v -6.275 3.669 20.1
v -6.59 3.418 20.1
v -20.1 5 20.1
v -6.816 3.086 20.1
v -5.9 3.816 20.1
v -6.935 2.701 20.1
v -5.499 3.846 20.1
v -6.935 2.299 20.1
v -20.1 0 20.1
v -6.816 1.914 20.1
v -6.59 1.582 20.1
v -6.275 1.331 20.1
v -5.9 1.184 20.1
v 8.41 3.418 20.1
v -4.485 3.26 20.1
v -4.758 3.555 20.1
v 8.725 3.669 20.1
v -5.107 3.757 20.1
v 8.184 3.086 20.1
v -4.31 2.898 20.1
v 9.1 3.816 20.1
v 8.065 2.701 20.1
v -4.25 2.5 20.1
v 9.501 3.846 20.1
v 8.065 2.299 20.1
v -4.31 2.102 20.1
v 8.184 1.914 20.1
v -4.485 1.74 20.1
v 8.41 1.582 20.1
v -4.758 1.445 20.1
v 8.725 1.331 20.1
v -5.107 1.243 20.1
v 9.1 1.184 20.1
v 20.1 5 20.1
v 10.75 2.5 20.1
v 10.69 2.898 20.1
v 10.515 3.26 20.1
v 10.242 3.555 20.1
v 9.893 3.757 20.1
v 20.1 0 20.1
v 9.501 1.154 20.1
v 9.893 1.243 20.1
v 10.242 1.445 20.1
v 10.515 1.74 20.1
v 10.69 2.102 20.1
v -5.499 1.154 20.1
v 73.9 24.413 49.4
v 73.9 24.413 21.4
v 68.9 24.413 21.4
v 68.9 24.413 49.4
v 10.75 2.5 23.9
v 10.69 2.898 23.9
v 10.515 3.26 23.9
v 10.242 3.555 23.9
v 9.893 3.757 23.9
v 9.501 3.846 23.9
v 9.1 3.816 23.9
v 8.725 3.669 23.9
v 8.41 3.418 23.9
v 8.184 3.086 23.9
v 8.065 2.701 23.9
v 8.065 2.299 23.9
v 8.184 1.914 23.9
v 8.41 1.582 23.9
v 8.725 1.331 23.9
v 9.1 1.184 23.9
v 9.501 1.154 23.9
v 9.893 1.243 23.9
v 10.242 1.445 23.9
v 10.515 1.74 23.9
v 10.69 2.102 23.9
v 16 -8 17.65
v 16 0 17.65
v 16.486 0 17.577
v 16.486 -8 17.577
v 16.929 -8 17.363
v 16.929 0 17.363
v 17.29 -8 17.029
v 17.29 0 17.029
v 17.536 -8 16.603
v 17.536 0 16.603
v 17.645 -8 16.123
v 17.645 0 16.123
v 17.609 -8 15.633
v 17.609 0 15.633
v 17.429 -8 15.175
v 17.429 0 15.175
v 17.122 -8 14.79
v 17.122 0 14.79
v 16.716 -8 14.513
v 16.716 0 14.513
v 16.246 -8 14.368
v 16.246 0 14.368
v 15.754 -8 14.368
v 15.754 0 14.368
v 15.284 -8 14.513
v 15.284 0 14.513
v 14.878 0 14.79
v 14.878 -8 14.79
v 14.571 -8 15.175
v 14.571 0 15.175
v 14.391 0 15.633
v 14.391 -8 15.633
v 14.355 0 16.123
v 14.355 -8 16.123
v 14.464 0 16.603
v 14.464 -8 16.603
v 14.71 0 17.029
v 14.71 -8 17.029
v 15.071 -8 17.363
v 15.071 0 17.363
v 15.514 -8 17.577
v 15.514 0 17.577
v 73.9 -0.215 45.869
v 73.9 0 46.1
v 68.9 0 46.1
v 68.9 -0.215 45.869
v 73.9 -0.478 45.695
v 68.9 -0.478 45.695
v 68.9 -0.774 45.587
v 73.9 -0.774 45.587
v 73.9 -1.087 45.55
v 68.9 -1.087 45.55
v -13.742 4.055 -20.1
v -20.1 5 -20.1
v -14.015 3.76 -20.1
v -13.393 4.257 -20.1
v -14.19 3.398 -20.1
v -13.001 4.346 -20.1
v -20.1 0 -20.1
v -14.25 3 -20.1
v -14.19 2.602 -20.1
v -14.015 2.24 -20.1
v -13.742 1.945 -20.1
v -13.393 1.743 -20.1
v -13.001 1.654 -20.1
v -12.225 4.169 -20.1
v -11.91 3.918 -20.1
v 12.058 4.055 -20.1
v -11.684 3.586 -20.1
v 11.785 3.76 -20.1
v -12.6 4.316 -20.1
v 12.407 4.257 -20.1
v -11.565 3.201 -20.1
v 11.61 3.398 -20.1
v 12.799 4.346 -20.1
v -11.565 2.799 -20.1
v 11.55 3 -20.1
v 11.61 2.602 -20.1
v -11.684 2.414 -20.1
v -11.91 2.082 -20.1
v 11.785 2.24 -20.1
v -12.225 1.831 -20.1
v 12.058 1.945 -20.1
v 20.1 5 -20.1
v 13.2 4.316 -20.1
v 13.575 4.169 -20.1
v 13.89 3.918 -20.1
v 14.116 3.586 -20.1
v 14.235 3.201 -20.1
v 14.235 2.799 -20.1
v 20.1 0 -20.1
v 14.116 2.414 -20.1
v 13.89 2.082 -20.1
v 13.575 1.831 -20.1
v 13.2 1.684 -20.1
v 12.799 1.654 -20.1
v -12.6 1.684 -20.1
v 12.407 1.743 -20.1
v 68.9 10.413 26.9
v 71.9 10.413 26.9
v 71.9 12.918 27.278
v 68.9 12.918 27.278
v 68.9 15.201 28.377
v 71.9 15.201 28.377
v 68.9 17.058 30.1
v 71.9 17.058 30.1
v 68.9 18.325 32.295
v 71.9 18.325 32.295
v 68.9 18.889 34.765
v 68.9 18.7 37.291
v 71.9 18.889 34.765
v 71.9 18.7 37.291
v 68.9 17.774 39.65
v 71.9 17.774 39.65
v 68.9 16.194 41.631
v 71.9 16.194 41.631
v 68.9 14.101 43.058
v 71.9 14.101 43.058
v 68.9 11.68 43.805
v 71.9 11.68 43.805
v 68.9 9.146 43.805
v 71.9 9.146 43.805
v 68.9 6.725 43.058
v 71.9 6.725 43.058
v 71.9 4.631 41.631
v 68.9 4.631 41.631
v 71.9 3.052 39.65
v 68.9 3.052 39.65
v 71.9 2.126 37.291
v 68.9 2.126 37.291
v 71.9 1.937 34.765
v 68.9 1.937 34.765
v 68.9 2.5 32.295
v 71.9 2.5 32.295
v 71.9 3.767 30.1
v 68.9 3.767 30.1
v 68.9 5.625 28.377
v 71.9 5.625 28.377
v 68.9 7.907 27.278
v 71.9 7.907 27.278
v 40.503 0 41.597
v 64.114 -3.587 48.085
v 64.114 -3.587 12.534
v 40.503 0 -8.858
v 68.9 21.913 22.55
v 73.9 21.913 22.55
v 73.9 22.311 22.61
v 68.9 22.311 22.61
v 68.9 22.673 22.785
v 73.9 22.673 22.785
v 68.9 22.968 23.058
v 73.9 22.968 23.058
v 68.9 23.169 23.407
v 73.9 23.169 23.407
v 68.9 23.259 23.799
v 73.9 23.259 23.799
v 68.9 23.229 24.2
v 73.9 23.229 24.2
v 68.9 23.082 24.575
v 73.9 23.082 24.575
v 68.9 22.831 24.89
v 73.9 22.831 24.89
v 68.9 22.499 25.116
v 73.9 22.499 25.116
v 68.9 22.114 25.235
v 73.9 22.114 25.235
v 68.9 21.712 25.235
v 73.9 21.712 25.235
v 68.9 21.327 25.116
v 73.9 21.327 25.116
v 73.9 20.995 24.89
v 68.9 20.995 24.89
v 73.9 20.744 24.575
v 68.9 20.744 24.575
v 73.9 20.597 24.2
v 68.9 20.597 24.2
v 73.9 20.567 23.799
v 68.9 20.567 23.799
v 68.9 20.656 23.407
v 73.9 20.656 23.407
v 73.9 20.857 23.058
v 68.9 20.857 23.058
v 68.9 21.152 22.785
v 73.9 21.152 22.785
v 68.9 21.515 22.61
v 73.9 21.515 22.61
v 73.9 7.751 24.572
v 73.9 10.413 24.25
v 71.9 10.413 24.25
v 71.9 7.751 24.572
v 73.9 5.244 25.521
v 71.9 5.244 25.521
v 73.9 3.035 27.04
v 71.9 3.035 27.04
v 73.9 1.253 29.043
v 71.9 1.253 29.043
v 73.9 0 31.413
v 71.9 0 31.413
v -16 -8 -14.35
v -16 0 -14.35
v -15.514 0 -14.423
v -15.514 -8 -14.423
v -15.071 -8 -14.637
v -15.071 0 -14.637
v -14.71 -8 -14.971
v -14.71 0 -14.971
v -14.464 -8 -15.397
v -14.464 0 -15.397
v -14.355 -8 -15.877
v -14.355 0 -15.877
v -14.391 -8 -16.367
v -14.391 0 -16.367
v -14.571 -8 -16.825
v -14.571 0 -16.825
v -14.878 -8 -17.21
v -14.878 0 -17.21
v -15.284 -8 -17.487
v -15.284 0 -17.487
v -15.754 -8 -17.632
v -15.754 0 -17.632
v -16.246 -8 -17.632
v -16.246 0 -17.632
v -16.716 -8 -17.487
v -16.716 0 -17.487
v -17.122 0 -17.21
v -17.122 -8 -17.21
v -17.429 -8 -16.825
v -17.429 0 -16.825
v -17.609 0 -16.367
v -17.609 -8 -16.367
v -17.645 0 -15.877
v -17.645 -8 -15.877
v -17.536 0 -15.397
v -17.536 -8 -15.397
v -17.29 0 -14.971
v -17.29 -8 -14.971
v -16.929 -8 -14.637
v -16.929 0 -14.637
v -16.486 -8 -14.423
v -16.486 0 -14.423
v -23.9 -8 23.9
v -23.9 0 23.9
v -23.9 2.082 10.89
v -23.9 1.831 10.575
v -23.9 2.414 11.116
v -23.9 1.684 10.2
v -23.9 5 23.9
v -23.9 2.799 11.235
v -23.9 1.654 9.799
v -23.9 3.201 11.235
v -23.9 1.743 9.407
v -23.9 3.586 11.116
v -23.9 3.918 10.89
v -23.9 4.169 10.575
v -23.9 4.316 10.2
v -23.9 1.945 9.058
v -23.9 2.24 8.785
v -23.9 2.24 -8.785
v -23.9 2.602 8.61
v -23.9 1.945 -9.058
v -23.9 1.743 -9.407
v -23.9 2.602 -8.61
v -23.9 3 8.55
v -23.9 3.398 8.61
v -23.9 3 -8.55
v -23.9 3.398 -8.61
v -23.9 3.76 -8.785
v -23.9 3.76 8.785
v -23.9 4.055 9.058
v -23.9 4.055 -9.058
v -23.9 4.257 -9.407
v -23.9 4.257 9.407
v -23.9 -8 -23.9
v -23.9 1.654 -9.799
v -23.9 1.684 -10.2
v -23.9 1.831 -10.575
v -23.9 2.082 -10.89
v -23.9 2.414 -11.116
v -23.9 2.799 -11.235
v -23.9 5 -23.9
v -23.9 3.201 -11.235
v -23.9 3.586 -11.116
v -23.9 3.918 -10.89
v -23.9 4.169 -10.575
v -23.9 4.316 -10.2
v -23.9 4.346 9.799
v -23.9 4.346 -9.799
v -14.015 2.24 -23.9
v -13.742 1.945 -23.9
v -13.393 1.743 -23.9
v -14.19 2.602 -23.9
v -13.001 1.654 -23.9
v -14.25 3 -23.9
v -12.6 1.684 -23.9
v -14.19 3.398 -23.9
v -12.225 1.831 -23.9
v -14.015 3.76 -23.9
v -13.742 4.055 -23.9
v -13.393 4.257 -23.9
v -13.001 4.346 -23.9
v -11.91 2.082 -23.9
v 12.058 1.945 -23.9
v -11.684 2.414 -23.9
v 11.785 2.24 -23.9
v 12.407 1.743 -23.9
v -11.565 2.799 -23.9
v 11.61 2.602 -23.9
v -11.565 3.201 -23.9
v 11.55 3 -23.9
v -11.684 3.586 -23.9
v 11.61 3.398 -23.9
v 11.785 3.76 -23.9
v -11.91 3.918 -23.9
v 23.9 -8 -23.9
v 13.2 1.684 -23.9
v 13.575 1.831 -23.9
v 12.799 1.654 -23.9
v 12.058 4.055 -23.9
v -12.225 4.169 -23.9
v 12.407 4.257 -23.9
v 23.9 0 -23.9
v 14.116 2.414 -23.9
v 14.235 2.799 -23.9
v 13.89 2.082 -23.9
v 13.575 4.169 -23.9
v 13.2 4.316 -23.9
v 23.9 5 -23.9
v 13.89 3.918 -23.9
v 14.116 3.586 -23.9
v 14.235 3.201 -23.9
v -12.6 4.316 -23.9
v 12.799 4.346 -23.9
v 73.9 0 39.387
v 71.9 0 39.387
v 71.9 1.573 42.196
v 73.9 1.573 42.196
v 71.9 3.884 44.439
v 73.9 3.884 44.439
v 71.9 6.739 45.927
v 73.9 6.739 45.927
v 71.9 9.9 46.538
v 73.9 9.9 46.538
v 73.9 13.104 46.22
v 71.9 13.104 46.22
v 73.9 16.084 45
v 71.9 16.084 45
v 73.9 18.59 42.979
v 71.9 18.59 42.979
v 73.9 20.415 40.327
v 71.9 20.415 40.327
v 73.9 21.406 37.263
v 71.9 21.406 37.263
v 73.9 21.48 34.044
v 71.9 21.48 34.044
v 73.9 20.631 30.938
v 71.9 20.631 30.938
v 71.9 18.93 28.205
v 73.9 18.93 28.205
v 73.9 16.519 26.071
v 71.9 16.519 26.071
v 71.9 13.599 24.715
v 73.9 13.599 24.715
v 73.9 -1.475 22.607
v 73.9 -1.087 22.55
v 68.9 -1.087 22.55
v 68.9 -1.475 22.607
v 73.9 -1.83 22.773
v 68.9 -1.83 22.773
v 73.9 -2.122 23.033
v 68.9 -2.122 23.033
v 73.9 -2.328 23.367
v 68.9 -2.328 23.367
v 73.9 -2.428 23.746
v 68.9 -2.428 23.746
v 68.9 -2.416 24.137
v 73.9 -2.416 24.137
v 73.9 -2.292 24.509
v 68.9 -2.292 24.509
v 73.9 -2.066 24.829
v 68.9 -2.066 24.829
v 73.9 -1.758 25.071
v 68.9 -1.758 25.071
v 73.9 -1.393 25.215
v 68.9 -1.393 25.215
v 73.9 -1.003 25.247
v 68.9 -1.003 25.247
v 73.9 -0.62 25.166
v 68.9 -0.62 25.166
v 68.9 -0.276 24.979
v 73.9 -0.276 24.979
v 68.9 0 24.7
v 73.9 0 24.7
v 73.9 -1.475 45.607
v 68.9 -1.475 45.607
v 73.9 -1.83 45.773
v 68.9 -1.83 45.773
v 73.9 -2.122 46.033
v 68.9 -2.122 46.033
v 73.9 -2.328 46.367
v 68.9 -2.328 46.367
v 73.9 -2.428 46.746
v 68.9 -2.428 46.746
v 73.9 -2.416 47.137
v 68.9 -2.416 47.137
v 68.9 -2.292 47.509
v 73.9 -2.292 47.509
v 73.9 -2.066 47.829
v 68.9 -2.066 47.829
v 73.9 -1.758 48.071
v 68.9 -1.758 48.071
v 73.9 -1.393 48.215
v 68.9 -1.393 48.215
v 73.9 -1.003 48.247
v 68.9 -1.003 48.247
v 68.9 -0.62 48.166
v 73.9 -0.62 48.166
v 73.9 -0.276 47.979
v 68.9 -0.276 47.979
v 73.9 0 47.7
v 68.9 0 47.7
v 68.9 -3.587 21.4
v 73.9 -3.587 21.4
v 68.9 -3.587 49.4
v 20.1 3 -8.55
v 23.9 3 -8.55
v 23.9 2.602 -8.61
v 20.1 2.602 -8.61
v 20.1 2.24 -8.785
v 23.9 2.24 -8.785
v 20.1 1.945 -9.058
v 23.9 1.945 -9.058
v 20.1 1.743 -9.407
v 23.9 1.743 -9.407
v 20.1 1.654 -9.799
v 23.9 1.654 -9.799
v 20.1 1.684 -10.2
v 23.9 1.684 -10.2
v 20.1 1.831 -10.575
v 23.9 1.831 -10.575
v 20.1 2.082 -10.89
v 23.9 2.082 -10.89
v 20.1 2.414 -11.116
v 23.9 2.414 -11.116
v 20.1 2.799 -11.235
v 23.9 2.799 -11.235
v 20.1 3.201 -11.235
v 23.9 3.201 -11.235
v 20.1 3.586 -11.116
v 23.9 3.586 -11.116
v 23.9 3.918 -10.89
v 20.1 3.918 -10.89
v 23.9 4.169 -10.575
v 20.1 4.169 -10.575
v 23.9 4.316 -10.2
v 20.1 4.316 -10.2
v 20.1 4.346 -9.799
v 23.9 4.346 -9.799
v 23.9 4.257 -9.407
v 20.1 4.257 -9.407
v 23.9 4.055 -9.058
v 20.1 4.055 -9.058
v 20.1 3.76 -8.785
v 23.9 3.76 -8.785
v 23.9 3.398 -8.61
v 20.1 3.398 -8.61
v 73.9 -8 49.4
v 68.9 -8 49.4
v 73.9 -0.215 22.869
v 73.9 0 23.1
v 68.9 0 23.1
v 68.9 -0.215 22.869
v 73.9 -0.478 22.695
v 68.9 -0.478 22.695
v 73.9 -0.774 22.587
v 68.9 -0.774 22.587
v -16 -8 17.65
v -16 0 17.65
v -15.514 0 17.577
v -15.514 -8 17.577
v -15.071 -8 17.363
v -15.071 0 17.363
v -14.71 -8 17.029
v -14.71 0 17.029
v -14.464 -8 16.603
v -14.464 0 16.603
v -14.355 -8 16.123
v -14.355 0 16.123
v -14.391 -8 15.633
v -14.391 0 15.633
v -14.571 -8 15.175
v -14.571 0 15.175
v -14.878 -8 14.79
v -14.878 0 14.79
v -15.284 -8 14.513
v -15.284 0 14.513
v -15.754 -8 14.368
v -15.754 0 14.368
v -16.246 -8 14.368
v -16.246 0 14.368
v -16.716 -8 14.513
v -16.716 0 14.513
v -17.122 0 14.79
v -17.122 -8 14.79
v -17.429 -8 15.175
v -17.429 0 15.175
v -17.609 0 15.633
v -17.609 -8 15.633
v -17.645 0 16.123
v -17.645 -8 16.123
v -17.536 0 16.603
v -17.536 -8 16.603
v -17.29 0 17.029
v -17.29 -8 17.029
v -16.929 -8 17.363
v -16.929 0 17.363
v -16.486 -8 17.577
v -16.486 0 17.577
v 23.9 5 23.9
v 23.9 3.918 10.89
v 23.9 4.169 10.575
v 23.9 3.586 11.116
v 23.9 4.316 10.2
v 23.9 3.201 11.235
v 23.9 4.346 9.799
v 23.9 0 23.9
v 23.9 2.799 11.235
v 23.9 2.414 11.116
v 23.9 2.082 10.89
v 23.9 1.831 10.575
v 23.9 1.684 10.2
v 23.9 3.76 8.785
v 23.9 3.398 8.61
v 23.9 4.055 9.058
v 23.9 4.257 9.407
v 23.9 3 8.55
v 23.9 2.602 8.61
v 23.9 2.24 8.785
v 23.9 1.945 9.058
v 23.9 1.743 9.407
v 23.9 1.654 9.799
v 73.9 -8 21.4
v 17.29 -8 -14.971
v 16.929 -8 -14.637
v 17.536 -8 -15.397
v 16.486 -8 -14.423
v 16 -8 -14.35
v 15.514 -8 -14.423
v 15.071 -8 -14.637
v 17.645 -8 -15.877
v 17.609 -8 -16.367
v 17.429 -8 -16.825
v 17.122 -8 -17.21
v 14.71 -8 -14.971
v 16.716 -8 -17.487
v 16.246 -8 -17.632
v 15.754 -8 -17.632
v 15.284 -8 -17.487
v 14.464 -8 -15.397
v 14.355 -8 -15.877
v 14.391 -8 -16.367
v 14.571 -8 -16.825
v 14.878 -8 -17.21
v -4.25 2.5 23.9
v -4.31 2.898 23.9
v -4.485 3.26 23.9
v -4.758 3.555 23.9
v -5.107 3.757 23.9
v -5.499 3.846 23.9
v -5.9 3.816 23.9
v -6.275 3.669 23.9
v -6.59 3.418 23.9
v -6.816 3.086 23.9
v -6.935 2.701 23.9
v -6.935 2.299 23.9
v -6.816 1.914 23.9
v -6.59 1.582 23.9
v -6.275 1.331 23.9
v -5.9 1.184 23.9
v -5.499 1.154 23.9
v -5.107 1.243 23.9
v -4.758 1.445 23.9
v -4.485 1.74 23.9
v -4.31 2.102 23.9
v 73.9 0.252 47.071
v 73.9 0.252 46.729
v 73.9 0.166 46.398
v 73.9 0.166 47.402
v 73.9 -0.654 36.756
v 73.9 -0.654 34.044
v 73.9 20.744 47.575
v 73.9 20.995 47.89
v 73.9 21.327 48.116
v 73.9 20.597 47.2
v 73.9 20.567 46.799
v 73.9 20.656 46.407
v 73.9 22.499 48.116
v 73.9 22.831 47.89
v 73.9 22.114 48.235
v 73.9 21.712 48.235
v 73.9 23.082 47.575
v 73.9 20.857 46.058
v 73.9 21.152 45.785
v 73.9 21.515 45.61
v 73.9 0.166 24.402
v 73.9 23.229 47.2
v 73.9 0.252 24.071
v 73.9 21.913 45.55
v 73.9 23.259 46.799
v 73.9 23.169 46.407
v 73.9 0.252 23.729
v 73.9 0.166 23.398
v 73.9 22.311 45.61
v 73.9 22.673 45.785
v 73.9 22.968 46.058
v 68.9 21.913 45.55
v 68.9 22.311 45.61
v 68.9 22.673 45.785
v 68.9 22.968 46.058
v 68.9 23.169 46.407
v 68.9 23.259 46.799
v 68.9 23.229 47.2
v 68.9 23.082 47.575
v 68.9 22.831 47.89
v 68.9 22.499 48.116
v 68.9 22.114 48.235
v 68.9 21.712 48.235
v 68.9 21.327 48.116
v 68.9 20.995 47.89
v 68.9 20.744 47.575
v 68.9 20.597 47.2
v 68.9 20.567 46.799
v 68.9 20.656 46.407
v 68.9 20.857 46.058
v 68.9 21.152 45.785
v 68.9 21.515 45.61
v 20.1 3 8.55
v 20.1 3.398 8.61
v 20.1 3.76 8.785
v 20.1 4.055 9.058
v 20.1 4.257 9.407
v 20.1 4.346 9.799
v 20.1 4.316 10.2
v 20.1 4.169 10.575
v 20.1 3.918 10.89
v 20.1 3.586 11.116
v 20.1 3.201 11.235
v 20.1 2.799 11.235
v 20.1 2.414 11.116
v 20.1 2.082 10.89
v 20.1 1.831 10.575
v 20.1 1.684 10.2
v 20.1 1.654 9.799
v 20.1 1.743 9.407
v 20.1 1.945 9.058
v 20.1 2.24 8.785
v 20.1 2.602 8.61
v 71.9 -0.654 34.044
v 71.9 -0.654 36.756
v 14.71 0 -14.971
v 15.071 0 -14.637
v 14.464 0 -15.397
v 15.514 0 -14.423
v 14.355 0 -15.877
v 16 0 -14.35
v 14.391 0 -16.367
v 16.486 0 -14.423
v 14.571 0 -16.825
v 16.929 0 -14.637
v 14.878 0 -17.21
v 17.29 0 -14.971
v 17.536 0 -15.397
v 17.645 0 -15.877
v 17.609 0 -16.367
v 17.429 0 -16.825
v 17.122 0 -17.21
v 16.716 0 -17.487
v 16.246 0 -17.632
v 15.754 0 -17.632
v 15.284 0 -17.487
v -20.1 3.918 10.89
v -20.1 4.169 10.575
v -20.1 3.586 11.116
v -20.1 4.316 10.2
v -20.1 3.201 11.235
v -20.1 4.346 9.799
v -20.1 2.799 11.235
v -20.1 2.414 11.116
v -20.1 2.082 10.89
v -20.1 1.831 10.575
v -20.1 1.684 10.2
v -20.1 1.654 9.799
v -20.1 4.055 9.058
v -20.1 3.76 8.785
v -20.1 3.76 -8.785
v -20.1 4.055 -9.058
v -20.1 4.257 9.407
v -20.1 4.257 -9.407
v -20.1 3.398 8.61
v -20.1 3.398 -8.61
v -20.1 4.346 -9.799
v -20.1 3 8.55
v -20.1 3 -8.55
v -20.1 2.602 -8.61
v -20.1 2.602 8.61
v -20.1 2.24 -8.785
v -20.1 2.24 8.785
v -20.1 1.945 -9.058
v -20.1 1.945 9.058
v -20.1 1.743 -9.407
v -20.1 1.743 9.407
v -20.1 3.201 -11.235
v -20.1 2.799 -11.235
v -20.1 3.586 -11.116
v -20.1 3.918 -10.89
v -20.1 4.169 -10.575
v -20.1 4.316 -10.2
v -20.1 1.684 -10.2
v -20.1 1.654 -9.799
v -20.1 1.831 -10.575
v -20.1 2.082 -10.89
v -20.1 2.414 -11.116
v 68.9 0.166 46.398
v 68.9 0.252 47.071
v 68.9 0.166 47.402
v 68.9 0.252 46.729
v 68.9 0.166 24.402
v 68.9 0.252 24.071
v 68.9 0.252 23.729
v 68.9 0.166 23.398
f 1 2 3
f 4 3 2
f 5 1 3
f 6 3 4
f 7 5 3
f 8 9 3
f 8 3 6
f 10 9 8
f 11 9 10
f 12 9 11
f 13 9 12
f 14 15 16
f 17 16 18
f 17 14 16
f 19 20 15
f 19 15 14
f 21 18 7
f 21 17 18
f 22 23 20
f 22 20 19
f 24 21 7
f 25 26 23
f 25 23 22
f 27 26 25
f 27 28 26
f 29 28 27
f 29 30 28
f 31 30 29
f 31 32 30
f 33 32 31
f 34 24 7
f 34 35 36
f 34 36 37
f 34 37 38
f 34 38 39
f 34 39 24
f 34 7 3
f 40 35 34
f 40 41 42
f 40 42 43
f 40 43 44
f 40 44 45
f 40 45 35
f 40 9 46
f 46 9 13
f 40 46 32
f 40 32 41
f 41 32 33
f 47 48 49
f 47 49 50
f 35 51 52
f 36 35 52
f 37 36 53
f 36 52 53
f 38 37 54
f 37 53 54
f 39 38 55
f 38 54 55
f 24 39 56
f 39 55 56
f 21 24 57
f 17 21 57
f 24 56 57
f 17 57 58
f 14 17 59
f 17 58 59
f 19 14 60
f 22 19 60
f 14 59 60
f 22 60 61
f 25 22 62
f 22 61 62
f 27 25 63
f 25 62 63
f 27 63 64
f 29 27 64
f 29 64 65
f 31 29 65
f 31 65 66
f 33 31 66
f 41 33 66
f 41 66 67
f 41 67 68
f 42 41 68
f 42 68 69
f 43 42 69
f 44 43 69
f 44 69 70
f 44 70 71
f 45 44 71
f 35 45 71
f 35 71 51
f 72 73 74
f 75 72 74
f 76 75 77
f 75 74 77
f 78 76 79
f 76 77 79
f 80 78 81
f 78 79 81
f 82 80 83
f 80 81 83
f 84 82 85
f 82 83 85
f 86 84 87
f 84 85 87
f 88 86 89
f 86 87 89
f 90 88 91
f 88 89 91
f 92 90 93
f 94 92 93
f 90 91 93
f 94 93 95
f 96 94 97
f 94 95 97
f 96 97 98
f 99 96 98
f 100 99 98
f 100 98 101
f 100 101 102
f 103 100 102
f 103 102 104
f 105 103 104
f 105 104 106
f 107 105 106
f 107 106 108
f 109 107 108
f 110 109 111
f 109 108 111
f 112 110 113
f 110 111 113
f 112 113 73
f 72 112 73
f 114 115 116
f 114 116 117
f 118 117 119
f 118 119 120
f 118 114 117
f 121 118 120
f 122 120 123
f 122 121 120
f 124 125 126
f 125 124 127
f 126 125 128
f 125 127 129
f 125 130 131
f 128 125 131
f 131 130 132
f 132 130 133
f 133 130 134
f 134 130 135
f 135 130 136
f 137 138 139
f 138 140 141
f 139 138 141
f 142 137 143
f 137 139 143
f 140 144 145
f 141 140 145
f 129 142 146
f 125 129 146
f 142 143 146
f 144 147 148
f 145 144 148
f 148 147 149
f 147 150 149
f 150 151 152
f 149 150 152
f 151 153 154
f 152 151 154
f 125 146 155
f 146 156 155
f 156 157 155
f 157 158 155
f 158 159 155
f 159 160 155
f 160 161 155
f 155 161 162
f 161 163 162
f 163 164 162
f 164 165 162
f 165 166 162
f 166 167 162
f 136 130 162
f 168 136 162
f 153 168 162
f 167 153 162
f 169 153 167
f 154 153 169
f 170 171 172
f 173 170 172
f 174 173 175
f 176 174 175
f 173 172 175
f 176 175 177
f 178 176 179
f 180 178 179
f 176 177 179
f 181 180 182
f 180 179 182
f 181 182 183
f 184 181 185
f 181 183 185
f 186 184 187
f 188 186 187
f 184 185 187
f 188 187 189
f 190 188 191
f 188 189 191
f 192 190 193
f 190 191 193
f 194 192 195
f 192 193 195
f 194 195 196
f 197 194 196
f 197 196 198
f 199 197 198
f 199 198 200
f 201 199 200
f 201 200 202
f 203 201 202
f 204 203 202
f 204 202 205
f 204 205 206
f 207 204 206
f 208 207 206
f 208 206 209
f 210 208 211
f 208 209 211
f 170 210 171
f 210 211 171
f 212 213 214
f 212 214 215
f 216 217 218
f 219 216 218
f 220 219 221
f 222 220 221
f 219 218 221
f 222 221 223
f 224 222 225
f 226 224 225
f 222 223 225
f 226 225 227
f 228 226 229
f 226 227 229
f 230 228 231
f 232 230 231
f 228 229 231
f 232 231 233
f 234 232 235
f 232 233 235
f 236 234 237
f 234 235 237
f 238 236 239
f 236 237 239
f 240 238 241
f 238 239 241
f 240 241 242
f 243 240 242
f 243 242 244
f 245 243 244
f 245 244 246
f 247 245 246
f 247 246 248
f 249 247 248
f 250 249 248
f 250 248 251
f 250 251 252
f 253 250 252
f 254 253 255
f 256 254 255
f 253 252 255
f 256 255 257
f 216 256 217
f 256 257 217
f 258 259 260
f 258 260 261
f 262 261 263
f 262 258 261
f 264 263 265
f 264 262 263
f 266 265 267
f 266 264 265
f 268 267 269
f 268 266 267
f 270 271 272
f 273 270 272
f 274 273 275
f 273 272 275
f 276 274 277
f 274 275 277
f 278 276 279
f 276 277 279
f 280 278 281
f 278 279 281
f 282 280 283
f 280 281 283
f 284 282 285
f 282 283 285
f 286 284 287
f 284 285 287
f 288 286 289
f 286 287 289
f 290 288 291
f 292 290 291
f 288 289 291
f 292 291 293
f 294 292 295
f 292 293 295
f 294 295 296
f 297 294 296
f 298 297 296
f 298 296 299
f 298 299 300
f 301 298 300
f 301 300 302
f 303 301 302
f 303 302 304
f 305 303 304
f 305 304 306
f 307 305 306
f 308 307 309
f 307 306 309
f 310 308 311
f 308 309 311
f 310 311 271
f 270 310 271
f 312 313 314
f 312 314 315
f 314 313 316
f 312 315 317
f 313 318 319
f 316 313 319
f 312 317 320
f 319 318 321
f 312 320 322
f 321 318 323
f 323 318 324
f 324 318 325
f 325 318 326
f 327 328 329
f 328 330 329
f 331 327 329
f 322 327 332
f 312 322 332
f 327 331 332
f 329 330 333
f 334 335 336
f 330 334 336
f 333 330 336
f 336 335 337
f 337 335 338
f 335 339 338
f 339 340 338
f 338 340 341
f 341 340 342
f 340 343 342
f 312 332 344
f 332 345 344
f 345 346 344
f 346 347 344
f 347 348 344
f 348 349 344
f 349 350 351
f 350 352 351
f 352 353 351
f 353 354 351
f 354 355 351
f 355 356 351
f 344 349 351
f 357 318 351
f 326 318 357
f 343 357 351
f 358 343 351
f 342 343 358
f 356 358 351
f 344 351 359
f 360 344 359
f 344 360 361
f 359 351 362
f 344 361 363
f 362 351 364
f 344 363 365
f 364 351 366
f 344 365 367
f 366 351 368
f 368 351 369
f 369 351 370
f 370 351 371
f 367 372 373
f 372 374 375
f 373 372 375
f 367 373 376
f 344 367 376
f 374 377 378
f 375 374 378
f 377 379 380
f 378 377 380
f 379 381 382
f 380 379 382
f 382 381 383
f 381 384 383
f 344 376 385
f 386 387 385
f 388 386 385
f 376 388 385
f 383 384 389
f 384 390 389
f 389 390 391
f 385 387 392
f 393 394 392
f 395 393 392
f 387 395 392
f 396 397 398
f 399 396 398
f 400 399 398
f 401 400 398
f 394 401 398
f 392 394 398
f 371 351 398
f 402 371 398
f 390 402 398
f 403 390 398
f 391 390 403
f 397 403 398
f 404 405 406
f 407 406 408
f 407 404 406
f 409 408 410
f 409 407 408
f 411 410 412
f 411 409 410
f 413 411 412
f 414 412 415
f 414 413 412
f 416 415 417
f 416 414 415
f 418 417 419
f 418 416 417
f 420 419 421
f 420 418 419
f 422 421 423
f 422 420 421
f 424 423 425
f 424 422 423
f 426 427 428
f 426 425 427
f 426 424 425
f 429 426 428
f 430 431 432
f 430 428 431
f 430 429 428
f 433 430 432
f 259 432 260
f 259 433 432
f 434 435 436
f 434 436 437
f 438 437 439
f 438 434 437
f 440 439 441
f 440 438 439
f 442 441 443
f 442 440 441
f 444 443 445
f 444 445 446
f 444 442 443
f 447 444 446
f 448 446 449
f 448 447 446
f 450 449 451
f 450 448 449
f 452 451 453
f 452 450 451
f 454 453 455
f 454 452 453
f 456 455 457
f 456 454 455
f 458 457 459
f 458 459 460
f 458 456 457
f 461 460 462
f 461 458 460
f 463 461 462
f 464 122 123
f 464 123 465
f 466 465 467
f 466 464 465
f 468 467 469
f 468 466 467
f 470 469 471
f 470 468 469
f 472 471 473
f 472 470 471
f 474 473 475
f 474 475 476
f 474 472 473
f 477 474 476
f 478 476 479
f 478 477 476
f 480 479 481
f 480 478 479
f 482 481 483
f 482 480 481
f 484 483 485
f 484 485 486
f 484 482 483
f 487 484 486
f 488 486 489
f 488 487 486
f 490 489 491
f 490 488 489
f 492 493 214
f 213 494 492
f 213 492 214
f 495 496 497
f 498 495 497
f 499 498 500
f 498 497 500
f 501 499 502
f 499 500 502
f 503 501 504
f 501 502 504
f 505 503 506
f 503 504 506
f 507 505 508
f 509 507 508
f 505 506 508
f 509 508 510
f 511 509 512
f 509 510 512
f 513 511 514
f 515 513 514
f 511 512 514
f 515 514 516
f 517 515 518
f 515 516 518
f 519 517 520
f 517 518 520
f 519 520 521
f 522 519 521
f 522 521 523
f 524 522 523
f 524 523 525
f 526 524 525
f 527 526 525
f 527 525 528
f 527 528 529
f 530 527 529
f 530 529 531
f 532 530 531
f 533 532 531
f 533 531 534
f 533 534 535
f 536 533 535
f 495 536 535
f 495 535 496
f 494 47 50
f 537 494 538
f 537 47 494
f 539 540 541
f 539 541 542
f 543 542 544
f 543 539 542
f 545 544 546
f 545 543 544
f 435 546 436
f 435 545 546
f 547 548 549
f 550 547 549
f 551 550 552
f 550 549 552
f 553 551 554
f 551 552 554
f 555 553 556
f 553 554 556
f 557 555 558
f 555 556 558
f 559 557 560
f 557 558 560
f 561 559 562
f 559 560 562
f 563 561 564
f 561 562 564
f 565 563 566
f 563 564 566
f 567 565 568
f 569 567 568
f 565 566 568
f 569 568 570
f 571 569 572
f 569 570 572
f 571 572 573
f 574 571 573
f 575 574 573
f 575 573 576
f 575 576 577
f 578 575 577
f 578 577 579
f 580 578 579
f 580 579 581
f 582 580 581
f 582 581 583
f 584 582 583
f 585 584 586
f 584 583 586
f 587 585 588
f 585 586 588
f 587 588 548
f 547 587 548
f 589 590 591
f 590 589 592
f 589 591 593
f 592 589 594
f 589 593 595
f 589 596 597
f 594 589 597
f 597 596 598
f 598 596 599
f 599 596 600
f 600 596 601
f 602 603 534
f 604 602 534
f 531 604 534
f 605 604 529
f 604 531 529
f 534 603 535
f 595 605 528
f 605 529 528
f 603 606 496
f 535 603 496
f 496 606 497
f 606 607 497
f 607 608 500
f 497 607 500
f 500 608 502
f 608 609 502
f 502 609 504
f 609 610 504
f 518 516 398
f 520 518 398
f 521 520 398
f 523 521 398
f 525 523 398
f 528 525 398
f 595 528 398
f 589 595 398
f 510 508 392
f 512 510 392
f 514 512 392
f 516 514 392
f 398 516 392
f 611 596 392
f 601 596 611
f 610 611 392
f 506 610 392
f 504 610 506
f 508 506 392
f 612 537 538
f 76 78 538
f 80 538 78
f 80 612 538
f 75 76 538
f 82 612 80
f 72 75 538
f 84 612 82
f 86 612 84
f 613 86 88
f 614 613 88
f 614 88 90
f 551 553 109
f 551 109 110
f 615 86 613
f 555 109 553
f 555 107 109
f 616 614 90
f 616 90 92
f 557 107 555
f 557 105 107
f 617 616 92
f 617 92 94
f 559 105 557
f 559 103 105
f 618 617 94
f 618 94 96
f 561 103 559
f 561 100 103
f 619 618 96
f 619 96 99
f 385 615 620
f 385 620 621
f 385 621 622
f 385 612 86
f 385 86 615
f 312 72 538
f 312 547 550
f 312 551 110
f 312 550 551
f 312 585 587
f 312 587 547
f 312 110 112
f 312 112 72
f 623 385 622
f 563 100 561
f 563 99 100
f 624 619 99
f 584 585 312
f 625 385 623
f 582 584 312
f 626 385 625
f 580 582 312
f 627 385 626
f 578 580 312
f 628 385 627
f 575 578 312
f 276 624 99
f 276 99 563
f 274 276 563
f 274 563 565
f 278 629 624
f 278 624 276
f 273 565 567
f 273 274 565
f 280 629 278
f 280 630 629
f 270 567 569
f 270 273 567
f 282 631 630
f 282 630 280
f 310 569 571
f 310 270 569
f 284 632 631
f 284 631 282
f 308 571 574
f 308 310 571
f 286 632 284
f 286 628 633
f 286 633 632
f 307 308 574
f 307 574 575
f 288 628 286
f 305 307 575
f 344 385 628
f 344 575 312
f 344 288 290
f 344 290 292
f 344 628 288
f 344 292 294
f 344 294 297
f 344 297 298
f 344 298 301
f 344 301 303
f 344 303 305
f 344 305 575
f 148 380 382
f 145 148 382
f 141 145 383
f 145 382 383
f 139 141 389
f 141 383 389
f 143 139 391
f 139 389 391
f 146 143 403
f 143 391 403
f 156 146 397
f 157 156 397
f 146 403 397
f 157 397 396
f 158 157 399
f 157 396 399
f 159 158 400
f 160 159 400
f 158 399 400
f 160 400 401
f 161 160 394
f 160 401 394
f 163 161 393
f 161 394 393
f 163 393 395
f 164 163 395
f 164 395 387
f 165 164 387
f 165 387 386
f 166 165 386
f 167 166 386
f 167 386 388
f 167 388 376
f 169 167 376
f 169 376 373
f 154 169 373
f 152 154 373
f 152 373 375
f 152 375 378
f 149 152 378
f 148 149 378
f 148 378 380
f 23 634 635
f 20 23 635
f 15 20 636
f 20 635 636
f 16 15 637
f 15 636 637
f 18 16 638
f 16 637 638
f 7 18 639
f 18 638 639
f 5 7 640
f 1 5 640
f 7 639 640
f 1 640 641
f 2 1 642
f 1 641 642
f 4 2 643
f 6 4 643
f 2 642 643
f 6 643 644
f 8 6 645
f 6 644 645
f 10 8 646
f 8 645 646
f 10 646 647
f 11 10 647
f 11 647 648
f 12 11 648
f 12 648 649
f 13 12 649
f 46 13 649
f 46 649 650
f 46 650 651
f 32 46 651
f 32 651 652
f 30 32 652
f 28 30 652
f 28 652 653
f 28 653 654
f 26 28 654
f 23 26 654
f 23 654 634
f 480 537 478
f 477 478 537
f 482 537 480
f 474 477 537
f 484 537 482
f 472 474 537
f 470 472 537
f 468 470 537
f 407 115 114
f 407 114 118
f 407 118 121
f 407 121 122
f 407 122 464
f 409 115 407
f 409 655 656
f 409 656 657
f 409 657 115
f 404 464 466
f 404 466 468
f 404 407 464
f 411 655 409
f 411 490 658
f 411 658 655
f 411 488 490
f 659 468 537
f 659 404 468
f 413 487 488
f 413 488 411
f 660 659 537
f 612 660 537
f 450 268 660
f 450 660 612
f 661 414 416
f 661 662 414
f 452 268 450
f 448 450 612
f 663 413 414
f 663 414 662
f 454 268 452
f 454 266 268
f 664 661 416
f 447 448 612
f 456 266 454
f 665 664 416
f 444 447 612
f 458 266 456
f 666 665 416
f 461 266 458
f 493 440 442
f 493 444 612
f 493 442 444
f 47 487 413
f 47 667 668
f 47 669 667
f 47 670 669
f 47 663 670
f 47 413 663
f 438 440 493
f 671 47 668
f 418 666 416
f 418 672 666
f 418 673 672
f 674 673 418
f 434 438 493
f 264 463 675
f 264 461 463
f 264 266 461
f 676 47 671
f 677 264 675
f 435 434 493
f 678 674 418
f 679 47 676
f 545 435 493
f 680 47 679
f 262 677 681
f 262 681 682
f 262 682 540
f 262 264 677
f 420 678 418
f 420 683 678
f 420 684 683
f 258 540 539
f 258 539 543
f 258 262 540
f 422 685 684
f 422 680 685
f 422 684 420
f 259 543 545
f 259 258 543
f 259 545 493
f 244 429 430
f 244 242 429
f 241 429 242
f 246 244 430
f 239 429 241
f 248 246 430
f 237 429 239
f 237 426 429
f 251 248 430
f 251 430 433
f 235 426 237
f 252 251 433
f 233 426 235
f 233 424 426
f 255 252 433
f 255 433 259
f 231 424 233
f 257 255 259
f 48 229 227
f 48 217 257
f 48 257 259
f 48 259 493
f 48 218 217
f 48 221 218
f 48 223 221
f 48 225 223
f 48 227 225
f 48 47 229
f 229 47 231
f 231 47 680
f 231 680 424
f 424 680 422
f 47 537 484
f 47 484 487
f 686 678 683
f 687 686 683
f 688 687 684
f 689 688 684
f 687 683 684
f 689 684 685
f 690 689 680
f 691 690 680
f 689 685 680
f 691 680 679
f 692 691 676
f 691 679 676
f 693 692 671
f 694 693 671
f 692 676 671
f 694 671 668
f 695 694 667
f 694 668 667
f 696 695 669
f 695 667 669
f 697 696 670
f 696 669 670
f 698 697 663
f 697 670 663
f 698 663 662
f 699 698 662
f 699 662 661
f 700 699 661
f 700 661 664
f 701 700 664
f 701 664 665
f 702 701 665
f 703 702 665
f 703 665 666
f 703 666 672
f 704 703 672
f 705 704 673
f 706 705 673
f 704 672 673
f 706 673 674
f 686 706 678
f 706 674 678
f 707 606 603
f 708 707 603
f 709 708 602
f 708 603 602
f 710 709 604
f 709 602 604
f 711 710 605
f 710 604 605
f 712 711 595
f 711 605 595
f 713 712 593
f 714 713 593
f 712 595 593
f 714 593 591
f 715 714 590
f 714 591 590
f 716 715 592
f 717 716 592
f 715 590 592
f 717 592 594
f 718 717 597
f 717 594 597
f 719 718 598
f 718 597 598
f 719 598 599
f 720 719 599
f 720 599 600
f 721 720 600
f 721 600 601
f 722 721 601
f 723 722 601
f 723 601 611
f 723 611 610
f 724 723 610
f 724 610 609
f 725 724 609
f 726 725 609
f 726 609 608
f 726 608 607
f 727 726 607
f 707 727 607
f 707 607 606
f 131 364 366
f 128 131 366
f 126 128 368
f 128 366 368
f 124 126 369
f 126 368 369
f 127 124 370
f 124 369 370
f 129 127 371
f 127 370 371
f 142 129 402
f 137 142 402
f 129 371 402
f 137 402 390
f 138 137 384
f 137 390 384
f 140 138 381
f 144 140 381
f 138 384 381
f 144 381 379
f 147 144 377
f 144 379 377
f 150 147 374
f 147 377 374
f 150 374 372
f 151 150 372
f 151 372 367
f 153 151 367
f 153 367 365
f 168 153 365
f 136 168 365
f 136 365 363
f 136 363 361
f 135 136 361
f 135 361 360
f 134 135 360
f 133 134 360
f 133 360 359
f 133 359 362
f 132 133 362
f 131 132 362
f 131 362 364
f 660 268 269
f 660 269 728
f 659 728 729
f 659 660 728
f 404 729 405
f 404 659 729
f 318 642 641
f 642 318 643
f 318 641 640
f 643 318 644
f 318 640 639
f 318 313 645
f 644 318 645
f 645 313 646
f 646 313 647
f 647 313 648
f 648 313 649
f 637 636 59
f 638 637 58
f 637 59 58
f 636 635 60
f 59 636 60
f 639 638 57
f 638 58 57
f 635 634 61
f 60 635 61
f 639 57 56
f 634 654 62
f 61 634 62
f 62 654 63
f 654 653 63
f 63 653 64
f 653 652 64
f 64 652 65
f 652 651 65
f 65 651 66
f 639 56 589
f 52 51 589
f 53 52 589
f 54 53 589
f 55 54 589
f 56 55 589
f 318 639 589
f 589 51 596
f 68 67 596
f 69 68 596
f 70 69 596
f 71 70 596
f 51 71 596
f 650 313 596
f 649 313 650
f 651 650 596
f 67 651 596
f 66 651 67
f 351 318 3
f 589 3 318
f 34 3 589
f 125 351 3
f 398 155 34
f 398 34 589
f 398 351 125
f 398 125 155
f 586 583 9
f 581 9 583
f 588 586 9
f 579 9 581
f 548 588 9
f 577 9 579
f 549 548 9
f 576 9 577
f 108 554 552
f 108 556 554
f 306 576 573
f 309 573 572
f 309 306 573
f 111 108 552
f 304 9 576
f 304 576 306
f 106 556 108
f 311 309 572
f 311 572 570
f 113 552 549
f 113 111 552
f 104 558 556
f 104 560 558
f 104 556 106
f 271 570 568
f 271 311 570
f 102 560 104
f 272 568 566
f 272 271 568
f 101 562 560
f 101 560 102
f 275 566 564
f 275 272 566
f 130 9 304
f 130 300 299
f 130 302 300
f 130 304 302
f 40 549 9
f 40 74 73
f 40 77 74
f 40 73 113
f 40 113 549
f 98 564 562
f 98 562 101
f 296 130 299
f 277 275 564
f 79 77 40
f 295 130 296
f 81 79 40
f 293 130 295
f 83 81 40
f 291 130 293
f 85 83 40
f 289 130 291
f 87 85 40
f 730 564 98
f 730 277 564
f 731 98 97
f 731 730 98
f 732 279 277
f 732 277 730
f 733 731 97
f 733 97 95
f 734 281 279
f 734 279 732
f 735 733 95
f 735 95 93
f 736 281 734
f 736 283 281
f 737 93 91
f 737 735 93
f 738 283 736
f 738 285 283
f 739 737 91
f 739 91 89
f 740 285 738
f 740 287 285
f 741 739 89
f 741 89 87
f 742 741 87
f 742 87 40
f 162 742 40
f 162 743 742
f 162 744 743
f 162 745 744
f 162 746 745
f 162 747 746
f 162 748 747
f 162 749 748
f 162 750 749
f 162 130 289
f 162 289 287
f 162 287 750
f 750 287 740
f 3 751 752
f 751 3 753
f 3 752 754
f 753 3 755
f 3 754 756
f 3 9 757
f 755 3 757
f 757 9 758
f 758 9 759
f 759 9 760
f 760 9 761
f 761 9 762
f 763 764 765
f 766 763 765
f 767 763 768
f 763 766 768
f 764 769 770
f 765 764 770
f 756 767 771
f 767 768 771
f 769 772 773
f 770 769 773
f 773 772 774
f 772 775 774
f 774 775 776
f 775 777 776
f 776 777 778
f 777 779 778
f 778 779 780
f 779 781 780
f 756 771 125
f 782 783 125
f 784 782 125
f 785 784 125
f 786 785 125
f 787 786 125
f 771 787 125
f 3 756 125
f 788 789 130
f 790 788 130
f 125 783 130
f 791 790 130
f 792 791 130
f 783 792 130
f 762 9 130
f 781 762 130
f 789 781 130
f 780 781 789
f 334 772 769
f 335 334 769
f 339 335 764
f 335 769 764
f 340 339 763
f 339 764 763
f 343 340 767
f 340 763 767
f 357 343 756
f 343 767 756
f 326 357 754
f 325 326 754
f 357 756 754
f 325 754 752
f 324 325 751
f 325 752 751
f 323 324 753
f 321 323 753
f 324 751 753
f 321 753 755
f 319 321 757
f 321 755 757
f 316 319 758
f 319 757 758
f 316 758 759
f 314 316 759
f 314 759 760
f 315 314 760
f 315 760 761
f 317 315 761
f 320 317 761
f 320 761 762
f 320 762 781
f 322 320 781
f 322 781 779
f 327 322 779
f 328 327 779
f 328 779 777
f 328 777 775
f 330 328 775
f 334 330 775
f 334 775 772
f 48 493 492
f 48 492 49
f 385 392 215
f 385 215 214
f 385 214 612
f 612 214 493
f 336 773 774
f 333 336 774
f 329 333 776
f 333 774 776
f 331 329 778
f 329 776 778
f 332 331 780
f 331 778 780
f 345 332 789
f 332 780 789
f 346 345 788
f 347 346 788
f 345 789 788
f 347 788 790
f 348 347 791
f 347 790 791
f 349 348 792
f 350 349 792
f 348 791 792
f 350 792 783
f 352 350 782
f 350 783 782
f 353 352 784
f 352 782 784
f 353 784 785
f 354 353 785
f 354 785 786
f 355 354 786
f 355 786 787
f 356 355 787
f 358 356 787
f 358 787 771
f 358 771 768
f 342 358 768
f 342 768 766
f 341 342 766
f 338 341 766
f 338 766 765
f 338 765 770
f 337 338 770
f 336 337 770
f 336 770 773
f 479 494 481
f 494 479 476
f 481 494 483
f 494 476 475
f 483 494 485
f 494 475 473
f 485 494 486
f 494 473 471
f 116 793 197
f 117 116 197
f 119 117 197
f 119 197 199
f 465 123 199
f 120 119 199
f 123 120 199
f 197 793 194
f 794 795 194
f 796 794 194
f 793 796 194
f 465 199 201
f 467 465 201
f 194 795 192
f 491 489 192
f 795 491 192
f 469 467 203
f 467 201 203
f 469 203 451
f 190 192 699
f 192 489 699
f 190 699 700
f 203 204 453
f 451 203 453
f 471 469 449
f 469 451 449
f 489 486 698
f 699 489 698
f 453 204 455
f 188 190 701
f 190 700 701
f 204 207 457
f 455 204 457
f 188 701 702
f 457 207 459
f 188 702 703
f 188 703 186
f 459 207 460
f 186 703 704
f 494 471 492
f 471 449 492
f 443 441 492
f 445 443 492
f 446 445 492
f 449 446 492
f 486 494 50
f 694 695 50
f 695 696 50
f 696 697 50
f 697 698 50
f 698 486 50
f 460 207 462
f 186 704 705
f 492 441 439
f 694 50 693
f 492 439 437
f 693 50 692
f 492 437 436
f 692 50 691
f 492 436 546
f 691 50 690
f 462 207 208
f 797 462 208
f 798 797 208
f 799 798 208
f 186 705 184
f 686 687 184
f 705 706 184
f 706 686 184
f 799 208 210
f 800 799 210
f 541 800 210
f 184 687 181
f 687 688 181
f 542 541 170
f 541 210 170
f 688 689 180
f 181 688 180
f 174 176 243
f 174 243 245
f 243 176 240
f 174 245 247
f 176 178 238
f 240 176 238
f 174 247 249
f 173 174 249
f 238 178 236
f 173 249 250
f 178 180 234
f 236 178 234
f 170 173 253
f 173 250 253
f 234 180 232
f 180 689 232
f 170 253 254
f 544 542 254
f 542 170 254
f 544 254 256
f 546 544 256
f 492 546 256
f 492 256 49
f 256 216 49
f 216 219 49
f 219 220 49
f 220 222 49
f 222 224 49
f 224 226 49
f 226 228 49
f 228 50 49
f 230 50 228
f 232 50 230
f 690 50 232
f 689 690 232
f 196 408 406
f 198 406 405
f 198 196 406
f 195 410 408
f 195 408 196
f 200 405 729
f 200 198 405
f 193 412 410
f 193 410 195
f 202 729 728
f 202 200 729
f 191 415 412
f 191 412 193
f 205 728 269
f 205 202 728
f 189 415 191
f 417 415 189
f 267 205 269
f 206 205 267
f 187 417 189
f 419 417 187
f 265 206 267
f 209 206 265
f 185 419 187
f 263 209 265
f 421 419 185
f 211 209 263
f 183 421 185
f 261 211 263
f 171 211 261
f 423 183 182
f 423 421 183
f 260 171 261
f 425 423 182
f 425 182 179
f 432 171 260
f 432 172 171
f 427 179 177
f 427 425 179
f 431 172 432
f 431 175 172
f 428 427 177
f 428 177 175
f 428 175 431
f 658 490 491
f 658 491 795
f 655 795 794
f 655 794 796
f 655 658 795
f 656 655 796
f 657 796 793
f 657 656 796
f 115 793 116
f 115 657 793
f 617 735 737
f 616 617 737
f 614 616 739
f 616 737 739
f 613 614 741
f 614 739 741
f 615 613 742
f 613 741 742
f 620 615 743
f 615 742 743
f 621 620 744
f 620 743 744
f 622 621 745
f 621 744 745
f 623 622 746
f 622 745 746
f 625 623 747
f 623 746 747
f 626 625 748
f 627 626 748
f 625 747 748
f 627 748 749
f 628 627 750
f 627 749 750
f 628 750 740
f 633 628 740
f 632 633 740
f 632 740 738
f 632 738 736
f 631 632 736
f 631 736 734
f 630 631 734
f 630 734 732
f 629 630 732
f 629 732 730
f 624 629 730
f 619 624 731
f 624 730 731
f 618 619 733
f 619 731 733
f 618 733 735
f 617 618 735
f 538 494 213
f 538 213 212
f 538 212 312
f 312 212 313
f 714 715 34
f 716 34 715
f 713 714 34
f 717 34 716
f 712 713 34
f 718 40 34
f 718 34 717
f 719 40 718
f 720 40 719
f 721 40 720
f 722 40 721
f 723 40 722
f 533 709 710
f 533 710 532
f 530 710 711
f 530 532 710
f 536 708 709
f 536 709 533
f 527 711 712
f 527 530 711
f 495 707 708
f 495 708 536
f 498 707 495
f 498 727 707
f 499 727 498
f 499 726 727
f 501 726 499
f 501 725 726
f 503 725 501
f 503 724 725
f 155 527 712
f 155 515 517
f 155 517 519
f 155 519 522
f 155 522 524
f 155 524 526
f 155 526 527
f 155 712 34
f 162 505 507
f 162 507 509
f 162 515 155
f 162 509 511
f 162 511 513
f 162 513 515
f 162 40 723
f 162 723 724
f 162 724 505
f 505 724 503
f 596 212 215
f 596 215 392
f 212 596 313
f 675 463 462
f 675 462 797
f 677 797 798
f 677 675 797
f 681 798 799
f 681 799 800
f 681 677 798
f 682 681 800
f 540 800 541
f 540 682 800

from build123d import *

# Parameters (mm, degrees)
SKETCH1_W            = 47.8
SKETCH1_H            = 47.8
SKETCH1_W_2          = 40.2
SKETCH1_H_2          = 40.2
BOSS_EXTRUDE1_DEPTH  = 5
CUT_EXTRUDE4_REACH   = 55.675
SKETCH6_R            = 1.35
CUT_EXTRUDE5_REACH   = 55.675
SKETCH7_R            = 1.35
SKETCH8_R            = 1.35
CUT_EXTRUDE6_DEPTH   = 54.675413366
SKETCH11_R           = 1.65
BOSS_EXTRUDE8_DEPTH  = 8
CUT_EXTRUDE7_DEPTH   = 105.393965343
SKETCH12_W           = 28
SKETCH12_H           = 28
SKETCH12_R           = 1.35
SKETCH12_R_2         = 11.15
BOSS_EXTRUDE9_DEPTH  = 5
BOSS_EXTRUDE10_START = -2
SKETCH12_3_R         = 11.15
SKETCH12_3_R_2       = 8.5
BOSS_EXTRUDE10_DEPTH = 3


with BuildPart() as part:
    # Sketch1 → Boss-Extrude1 (new body)
    with BuildSketch(Plane(origin=(0, 0, 0), x_dir=(1, 0, 0), z_dir=(0, 1, 0))):
        Rectangle(SKETCH1_W, SKETCH1_H)
        Rectangle(SKETCH1_W_2, SKETCH1_H_2, mode=Mode.SUBTRACT)
    extrude(amount=BOSS_EXTRUDE1_DEPTH)

    # Sketch6 → Cut-Extrude4 (cut, up to next)
    with BuildSketch(Plane(origin=(0, 0, -23.9), x_dir=(-1, 0, 0), z_dir=(0, 0, -1)), mode=Mode.PRIVATE) as cut_extrude4_sk1:
        with Locations((-12.9, 3)):
            Circle(SKETCH6_R)
    cut_extrude4_tool1 = extrude(cut_extrude4_sk1.sketch, amount=-CUT_EXTRUDE4_REACH, mode=Mode.PRIVATE) & part.part
    # Sketch6 → Cut-Extrude4 (cut, up to next)
    with BuildSketch(Plane(origin=(0, 0, -23.9), x_dir=(-1, 0, 0), z_dir=(0, 0, -1)), mode=Mode.PRIVATE) as cut_extrude4_sk2:
        with Locations((12.9, 3)):
            Circle(SKETCH6_R)
    cut_extrude4_tool2 = extrude(cut_extrude4_sk2.sketch, amount=-CUT_EXTRUDE4_REACH, mode=Mode.PRIVATE) & part.part
    add(cut_extrude4_tool1.solids().sort_by_distance((12.9, 3, -23.9))[0], mode=Mode.SUBTRACT)
    add(cut_extrude4_tool2.solids().sort_by_distance((-12.9, 3, -23.9))[0], mode=Mode.SUBTRACT)

    # Sketch7 → Cut-Extrude5 (cut, up to next)
    with BuildSketch(Plane.XY.offset(23.9), mode=Mode.PRIVATE) as cut_extrude5_sk1:
        with Locations((9.4, 2.5)):
            Circle(SKETCH7_R)
    cut_extrude5_tool1 = extrude(cut_extrude5_sk1.sketch, amount=-CUT_EXTRUDE5_REACH, mode=Mode.PRIVATE) & part.part
    # Sketch7 → Cut-Extrude5 (cut, up to next)
    with BuildSketch(Plane.XY.offset(23.9), mode=Mode.PRIVATE) as cut_extrude5_sk2:
        with Locations((-5.6, 2.5)):
            Circle(SKETCH7_R)
    cut_extrude5_tool2 = extrude(cut_extrude5_sk2.sketch, amount=-CUT_EXTRUDE5_REACH, mode=Mode.PRIVATE) & part.part
    add(cut_extrude5_tool1.solids().sort_by_distance((9.4, 2.5, 23.9))[0], mode=Mode.SUBTRACT)
    add(cut_extrude5_tool2.solids().sort_by_distance((-5.6, 2.5, 23.9))[0], mode=Mode.SUBTRACT)

    # Sketch8 → Cut-Extrude6 (cut, through all)
    with BuildSketch(Plane(origin=(23.9, 0, 0), x_dir=(0, 0, -1), z_dir=(1, 0, 0))):
        with Locations((-9.9, 3)):
            Circle(SKETCH8_R)
        with Locations((9.9, 3)):
            Circle(SKETCH8_R)
    extrude(amount=-CUT_EXTRUDE6_DEPTH, mode=Mode.SUBTRACT)

    # Sketch11 → Boss-Extrude8 (add)
    with BuildSketch(Plane(origin=(0, 0, 0), x_dir=(1, 0, 0), z_dir=(0, 1, 0))):
        Polygon((73.9, -49.4), (73.9, -21.4), (23.9, 23.9), (-23.9, 23.9), (-23.9, -23.9), (68.9, -49.4), align=None)
        with Locations((16, 16)):
            Circle(SKETCH11_R, mode=Mode.SUBTRACT)
        with Locations((-16, 16)):
            Circle(SKETCH11_R, mode=Mode.SUBTRACT)
        with Locations((-16, -16)):
            Circle(SKETCH11_R, mode=Mode.SUBTRACT)
        with Locations((16, -16)):
            Circle(SKETCH11_R, mode=Mode.SUBTRACT)
    extrude(amount=-BOSS_EXTRUDE8_DEPTH)

    # Sketch13 → Cut-Extrude7 (cut, through all)
    with BuildSketch(Plane.XY.offset(49.4)):
        Polygon((73.9, -3.587183479), (64.114380232, -3.587183479), (28.73812358, 1.78739259), (73.9, 1.78739259), align=None)
    extrude(amount=-CUT_EXTRUDE7_DEPTH, mode=Mode.SUBTRACT)

    # Sketch12 → Boss-Extrude9 (add)
    with BuildSketch(Plane(origin=(73.9, 0, 0), x_dir=(0, 0, -1), z_dir=(1, 0, 0))):
        with Locations((-35.4, 10.412816521)):
            Rectangle(SKETCH12_W, SKETCH12_H)
        with Locations((-46.9, -1.087183479)):
            Circle(SKETCH12_R, mode=Mode.SUBTRACT)
        with Locations((-35.4, 10.412816521)):
            Circle(SKETCH12_R_2, mode=Mode.SUBTRACT)
        with Locations((-23.9, -1.087183479)):
            Circle(SKETCH12_R, mode=Mode.SUBTRACT)
        with Locations((-46.9, 21.912816521)):
            Circle(SKETCH12_R, mode=Mode.SUBTRACT)
        with Locations((-23.9, 21.912816521)):
            Circle(SKETCH12_R, mode=Mode.SUBTRACT)
    extrude(amount=-BOSS_EXTRUDE9_DEPTH)

    # Sketch12<3> → Boss-Extrude10 (add)
    with BuildSketch(Plane(origin=(73.9, 0, 0), x_dir=(0, 0, -1), z_dir=(1, 0, 0)).offset(BOSS_EXTRUDE10_START)):
        with Locations((-35.4, 10.412816521)):
            Circle(SKETCH12_3_R)
        with Locations((-35.4, 10.412816521)):
            Circle(SKETCH12_3_R_2, mode=Mode.SUBTRACT)
    extrude(amount=-BOSS_EXTRUDE10_DEPTH)


solid = part.part
